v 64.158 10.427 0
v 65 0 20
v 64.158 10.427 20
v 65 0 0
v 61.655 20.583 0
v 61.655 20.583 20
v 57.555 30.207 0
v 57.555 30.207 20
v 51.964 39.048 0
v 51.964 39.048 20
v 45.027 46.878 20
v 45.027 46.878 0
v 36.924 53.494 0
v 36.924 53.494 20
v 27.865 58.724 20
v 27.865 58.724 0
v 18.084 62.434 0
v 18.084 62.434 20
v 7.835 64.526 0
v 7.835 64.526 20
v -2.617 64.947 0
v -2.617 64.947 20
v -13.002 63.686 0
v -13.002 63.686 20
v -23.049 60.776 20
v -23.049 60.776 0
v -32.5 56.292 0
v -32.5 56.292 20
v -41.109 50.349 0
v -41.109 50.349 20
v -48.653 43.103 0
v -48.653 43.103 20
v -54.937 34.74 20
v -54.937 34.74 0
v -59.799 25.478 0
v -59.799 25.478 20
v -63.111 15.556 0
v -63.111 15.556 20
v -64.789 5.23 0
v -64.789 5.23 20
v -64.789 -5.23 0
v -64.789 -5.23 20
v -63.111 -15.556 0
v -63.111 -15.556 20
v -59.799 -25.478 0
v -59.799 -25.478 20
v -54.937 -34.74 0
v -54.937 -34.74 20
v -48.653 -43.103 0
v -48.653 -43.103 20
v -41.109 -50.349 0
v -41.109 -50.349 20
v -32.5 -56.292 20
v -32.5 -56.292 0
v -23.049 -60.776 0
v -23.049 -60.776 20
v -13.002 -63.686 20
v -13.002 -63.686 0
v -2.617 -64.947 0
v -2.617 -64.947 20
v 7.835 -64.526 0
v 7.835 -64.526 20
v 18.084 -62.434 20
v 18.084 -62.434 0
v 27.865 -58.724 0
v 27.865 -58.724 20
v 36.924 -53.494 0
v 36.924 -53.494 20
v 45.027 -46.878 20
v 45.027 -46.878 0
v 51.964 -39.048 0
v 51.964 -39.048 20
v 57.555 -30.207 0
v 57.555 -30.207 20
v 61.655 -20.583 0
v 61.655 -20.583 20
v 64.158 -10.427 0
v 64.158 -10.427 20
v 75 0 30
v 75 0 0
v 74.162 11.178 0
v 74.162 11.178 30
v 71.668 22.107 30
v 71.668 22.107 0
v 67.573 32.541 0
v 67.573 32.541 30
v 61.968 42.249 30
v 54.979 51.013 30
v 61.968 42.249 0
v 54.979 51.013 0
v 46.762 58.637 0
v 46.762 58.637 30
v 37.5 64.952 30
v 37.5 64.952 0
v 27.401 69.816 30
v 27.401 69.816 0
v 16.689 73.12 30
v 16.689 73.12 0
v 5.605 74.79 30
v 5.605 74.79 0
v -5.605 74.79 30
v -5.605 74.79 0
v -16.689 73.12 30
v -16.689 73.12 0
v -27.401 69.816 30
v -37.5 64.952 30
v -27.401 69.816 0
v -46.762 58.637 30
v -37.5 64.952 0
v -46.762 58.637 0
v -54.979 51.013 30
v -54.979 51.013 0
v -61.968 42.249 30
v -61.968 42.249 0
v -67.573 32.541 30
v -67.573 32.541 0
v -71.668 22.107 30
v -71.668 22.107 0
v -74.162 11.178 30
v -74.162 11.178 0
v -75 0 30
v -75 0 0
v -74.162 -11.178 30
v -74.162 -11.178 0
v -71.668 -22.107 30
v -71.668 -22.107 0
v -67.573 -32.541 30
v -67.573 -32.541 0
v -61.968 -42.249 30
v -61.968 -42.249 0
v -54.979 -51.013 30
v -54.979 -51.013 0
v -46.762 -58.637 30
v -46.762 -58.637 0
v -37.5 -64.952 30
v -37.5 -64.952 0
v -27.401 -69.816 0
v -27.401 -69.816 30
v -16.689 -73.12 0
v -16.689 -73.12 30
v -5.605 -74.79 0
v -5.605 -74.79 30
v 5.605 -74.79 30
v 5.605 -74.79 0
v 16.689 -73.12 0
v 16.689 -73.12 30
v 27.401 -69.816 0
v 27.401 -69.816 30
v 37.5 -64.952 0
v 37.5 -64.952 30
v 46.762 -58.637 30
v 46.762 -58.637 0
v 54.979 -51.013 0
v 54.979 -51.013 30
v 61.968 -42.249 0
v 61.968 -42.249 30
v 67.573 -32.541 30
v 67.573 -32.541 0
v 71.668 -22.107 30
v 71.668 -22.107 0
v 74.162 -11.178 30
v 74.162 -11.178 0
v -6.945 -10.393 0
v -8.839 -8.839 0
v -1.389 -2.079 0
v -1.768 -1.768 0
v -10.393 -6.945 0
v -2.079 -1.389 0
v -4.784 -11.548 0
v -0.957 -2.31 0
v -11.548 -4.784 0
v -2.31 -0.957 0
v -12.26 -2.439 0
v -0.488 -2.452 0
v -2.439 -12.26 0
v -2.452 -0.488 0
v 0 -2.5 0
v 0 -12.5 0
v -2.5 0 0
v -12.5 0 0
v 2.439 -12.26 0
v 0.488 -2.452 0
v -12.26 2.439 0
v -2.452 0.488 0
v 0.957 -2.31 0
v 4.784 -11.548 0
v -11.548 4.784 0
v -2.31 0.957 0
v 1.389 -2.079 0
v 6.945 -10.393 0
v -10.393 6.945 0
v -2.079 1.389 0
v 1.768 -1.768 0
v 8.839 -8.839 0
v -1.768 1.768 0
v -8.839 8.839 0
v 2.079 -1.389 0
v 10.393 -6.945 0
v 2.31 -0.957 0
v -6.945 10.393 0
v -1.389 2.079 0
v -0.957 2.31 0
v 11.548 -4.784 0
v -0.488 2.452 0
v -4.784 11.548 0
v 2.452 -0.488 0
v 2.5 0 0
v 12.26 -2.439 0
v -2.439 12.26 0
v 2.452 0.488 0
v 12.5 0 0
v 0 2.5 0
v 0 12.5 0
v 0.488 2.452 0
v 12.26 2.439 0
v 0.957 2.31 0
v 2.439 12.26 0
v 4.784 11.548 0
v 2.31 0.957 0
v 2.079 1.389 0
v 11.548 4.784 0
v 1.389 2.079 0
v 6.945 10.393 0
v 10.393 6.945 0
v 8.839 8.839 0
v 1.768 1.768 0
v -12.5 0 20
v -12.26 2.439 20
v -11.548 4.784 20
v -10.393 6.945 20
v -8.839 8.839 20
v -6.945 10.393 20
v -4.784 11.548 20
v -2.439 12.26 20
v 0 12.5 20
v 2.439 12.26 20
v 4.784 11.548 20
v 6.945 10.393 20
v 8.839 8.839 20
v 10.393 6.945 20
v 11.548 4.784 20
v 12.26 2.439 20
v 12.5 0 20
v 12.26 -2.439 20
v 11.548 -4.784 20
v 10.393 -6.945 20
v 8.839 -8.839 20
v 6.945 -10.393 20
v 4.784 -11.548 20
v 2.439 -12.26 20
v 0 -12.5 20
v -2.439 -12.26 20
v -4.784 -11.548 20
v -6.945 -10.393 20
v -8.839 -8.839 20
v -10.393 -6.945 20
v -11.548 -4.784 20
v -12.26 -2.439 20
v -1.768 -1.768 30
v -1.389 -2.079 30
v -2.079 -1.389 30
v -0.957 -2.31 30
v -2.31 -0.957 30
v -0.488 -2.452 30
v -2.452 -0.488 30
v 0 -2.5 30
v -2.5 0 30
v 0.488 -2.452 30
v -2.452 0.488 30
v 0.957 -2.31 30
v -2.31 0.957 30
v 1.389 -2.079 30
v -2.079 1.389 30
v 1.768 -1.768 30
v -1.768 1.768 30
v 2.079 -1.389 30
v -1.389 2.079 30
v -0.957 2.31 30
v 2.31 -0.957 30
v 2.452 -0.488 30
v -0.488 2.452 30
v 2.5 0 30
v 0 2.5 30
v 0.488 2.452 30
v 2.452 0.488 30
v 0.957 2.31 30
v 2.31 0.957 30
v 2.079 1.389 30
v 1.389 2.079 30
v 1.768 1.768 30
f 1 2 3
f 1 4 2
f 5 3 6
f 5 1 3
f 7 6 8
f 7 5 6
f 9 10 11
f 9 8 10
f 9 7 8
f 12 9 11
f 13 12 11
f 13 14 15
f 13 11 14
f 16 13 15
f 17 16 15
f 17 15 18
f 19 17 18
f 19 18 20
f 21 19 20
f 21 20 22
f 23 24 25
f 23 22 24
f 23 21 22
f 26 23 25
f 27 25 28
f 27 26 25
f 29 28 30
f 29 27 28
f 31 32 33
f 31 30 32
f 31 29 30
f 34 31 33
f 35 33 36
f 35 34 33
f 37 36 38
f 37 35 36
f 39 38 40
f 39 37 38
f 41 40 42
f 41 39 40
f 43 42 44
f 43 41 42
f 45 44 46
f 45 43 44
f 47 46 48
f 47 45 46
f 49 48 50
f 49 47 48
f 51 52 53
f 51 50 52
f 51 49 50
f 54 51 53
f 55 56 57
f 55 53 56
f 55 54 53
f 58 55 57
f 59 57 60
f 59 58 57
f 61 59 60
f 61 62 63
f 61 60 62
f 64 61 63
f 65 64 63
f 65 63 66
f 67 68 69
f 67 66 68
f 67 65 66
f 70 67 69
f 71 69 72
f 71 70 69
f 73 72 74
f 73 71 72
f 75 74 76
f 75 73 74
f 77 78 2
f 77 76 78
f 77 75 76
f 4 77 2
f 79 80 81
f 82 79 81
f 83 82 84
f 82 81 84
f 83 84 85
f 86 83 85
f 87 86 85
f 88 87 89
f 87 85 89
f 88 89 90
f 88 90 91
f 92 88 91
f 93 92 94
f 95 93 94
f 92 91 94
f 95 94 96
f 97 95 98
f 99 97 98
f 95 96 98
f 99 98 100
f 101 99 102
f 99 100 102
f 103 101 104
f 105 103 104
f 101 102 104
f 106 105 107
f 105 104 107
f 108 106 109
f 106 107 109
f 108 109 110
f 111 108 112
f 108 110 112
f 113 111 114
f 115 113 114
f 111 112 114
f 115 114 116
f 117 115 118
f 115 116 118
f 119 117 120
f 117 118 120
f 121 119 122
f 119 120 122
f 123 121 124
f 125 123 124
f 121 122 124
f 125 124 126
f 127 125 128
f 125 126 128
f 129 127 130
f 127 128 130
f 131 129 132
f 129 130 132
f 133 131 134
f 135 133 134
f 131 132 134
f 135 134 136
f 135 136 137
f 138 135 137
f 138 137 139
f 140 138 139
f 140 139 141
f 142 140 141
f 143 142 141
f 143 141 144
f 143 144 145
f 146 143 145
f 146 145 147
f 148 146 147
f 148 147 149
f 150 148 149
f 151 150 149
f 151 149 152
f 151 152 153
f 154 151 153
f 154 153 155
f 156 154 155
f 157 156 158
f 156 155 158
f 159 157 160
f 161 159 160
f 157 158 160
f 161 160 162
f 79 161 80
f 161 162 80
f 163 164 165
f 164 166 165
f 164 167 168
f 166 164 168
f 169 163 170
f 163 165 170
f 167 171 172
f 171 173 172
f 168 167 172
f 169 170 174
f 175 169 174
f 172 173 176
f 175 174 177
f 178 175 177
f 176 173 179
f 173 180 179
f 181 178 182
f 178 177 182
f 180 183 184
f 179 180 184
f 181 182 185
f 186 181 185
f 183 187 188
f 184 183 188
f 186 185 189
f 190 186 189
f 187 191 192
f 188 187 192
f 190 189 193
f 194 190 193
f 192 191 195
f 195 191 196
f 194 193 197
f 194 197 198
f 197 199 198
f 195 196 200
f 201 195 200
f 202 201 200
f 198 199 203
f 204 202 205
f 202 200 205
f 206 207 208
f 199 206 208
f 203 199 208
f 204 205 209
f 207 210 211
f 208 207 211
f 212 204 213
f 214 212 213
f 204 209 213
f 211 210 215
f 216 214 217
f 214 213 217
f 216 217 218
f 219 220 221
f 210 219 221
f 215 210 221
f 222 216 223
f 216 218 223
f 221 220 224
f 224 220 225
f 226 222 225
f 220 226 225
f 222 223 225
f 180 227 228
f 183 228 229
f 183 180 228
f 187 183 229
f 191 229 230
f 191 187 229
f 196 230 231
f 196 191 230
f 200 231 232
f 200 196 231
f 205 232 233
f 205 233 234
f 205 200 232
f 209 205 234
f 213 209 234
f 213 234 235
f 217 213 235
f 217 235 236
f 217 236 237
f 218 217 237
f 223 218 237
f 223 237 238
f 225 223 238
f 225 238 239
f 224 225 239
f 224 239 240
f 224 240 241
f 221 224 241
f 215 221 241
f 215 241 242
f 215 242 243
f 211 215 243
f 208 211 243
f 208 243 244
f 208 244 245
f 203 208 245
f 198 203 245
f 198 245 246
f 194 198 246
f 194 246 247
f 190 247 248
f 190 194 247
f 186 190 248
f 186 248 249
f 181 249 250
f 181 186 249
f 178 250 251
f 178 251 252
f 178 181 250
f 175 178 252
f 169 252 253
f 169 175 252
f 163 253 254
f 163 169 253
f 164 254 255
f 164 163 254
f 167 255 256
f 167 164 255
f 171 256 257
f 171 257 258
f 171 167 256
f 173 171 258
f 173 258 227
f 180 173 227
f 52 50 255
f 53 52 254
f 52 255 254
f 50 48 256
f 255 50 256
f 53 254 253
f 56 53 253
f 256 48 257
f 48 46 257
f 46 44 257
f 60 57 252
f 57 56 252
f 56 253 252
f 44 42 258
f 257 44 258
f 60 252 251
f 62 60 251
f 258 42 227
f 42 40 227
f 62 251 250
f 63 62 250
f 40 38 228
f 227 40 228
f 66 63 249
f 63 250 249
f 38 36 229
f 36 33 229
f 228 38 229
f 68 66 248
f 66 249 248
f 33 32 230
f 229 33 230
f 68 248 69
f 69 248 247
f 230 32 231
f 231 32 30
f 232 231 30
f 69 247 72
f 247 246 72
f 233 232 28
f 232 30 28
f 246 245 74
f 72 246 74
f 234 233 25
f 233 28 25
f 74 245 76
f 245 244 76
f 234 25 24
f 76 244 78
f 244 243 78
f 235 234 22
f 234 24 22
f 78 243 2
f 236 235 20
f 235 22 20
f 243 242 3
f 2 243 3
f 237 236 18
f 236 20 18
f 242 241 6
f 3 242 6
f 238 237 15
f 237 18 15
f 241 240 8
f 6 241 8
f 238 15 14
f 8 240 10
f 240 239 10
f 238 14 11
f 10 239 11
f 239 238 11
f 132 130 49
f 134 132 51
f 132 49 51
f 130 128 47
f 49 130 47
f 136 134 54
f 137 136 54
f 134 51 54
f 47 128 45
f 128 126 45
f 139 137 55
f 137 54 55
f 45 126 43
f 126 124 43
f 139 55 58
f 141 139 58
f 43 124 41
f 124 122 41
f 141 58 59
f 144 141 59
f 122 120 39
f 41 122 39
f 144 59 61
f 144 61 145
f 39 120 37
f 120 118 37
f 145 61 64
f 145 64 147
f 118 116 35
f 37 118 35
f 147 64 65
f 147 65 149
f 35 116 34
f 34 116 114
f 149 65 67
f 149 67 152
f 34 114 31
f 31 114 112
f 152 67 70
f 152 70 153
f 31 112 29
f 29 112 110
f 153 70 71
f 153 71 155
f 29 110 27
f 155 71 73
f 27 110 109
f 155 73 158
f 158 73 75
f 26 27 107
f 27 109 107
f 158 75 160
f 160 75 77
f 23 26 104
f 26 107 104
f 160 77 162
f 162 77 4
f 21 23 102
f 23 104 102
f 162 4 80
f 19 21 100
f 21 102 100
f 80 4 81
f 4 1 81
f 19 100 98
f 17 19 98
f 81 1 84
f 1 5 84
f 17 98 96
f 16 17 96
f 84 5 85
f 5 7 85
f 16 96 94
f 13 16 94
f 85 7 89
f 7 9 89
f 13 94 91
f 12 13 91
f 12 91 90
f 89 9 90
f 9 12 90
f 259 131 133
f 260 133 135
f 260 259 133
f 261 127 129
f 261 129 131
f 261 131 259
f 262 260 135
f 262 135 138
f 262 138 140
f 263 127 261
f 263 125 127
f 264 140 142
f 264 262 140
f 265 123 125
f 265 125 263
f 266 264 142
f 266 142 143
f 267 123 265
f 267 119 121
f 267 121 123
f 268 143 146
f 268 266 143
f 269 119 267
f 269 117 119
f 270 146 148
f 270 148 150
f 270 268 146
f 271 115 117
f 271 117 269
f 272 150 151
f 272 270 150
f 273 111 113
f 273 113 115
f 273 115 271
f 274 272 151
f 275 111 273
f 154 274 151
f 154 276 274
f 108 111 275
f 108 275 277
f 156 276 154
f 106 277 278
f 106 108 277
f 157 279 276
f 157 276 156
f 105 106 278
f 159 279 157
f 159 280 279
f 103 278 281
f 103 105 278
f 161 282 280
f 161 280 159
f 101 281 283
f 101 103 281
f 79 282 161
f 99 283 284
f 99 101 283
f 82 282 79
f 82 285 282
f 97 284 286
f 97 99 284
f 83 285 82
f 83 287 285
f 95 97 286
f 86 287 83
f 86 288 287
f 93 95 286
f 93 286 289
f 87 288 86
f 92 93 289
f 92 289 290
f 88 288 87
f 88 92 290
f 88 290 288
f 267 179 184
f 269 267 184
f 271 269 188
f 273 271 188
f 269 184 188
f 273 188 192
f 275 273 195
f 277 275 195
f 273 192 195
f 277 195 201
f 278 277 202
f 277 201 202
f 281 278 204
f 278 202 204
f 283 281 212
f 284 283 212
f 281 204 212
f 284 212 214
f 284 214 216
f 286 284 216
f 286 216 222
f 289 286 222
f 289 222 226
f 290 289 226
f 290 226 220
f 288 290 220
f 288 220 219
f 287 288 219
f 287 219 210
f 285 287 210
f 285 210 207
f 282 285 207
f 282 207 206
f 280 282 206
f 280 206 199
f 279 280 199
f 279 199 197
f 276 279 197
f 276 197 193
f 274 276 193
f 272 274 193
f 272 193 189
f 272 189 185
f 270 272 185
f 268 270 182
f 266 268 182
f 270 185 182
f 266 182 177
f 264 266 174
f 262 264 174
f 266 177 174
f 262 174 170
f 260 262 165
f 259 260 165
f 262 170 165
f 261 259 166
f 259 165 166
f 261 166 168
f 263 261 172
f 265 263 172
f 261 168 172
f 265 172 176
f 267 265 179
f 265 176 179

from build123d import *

# Parameters (mm, degrees)
SKETCH1_R           = 75
BOSS_EXTRUDE1_DEPTH = 30
SKETCH2_R           = 2.5
CUT_EXTRUDE1_DEPTH  = 31
SHELL1_T            = -10


with BuildPart() as part:
    # Sketch1 → Boss-Extrude1 (new body)
    with BuildSketch(Plane.XY):
        Circle(SKETCH1_R)
    extrude(amount=BOSS_EXTRUDE1_DEPTH)

    # Sketch2 → Cut-Extrude1 (cut, through all)
    with BuildSketch(Plane(origin=(0, 0, 0), x_dir=(-1, 0, 0), z_dir=(0, 0, -1))):
        Circle(SKETCH2_R)
    extrude(amount=-CUT_EXTRUDE1_DEPTH, mode=Mode.SUBTRACT)

    # Shell1
    shell1_openings = [part.faces().sort_by_distance(p)[0] for p in [
        (-2.5, 0, 0),
    ]]
    offset(amount=SHELL1_T, openings=shell1_openings, kind=Kind.INTERSECTION)


solid = part.part
